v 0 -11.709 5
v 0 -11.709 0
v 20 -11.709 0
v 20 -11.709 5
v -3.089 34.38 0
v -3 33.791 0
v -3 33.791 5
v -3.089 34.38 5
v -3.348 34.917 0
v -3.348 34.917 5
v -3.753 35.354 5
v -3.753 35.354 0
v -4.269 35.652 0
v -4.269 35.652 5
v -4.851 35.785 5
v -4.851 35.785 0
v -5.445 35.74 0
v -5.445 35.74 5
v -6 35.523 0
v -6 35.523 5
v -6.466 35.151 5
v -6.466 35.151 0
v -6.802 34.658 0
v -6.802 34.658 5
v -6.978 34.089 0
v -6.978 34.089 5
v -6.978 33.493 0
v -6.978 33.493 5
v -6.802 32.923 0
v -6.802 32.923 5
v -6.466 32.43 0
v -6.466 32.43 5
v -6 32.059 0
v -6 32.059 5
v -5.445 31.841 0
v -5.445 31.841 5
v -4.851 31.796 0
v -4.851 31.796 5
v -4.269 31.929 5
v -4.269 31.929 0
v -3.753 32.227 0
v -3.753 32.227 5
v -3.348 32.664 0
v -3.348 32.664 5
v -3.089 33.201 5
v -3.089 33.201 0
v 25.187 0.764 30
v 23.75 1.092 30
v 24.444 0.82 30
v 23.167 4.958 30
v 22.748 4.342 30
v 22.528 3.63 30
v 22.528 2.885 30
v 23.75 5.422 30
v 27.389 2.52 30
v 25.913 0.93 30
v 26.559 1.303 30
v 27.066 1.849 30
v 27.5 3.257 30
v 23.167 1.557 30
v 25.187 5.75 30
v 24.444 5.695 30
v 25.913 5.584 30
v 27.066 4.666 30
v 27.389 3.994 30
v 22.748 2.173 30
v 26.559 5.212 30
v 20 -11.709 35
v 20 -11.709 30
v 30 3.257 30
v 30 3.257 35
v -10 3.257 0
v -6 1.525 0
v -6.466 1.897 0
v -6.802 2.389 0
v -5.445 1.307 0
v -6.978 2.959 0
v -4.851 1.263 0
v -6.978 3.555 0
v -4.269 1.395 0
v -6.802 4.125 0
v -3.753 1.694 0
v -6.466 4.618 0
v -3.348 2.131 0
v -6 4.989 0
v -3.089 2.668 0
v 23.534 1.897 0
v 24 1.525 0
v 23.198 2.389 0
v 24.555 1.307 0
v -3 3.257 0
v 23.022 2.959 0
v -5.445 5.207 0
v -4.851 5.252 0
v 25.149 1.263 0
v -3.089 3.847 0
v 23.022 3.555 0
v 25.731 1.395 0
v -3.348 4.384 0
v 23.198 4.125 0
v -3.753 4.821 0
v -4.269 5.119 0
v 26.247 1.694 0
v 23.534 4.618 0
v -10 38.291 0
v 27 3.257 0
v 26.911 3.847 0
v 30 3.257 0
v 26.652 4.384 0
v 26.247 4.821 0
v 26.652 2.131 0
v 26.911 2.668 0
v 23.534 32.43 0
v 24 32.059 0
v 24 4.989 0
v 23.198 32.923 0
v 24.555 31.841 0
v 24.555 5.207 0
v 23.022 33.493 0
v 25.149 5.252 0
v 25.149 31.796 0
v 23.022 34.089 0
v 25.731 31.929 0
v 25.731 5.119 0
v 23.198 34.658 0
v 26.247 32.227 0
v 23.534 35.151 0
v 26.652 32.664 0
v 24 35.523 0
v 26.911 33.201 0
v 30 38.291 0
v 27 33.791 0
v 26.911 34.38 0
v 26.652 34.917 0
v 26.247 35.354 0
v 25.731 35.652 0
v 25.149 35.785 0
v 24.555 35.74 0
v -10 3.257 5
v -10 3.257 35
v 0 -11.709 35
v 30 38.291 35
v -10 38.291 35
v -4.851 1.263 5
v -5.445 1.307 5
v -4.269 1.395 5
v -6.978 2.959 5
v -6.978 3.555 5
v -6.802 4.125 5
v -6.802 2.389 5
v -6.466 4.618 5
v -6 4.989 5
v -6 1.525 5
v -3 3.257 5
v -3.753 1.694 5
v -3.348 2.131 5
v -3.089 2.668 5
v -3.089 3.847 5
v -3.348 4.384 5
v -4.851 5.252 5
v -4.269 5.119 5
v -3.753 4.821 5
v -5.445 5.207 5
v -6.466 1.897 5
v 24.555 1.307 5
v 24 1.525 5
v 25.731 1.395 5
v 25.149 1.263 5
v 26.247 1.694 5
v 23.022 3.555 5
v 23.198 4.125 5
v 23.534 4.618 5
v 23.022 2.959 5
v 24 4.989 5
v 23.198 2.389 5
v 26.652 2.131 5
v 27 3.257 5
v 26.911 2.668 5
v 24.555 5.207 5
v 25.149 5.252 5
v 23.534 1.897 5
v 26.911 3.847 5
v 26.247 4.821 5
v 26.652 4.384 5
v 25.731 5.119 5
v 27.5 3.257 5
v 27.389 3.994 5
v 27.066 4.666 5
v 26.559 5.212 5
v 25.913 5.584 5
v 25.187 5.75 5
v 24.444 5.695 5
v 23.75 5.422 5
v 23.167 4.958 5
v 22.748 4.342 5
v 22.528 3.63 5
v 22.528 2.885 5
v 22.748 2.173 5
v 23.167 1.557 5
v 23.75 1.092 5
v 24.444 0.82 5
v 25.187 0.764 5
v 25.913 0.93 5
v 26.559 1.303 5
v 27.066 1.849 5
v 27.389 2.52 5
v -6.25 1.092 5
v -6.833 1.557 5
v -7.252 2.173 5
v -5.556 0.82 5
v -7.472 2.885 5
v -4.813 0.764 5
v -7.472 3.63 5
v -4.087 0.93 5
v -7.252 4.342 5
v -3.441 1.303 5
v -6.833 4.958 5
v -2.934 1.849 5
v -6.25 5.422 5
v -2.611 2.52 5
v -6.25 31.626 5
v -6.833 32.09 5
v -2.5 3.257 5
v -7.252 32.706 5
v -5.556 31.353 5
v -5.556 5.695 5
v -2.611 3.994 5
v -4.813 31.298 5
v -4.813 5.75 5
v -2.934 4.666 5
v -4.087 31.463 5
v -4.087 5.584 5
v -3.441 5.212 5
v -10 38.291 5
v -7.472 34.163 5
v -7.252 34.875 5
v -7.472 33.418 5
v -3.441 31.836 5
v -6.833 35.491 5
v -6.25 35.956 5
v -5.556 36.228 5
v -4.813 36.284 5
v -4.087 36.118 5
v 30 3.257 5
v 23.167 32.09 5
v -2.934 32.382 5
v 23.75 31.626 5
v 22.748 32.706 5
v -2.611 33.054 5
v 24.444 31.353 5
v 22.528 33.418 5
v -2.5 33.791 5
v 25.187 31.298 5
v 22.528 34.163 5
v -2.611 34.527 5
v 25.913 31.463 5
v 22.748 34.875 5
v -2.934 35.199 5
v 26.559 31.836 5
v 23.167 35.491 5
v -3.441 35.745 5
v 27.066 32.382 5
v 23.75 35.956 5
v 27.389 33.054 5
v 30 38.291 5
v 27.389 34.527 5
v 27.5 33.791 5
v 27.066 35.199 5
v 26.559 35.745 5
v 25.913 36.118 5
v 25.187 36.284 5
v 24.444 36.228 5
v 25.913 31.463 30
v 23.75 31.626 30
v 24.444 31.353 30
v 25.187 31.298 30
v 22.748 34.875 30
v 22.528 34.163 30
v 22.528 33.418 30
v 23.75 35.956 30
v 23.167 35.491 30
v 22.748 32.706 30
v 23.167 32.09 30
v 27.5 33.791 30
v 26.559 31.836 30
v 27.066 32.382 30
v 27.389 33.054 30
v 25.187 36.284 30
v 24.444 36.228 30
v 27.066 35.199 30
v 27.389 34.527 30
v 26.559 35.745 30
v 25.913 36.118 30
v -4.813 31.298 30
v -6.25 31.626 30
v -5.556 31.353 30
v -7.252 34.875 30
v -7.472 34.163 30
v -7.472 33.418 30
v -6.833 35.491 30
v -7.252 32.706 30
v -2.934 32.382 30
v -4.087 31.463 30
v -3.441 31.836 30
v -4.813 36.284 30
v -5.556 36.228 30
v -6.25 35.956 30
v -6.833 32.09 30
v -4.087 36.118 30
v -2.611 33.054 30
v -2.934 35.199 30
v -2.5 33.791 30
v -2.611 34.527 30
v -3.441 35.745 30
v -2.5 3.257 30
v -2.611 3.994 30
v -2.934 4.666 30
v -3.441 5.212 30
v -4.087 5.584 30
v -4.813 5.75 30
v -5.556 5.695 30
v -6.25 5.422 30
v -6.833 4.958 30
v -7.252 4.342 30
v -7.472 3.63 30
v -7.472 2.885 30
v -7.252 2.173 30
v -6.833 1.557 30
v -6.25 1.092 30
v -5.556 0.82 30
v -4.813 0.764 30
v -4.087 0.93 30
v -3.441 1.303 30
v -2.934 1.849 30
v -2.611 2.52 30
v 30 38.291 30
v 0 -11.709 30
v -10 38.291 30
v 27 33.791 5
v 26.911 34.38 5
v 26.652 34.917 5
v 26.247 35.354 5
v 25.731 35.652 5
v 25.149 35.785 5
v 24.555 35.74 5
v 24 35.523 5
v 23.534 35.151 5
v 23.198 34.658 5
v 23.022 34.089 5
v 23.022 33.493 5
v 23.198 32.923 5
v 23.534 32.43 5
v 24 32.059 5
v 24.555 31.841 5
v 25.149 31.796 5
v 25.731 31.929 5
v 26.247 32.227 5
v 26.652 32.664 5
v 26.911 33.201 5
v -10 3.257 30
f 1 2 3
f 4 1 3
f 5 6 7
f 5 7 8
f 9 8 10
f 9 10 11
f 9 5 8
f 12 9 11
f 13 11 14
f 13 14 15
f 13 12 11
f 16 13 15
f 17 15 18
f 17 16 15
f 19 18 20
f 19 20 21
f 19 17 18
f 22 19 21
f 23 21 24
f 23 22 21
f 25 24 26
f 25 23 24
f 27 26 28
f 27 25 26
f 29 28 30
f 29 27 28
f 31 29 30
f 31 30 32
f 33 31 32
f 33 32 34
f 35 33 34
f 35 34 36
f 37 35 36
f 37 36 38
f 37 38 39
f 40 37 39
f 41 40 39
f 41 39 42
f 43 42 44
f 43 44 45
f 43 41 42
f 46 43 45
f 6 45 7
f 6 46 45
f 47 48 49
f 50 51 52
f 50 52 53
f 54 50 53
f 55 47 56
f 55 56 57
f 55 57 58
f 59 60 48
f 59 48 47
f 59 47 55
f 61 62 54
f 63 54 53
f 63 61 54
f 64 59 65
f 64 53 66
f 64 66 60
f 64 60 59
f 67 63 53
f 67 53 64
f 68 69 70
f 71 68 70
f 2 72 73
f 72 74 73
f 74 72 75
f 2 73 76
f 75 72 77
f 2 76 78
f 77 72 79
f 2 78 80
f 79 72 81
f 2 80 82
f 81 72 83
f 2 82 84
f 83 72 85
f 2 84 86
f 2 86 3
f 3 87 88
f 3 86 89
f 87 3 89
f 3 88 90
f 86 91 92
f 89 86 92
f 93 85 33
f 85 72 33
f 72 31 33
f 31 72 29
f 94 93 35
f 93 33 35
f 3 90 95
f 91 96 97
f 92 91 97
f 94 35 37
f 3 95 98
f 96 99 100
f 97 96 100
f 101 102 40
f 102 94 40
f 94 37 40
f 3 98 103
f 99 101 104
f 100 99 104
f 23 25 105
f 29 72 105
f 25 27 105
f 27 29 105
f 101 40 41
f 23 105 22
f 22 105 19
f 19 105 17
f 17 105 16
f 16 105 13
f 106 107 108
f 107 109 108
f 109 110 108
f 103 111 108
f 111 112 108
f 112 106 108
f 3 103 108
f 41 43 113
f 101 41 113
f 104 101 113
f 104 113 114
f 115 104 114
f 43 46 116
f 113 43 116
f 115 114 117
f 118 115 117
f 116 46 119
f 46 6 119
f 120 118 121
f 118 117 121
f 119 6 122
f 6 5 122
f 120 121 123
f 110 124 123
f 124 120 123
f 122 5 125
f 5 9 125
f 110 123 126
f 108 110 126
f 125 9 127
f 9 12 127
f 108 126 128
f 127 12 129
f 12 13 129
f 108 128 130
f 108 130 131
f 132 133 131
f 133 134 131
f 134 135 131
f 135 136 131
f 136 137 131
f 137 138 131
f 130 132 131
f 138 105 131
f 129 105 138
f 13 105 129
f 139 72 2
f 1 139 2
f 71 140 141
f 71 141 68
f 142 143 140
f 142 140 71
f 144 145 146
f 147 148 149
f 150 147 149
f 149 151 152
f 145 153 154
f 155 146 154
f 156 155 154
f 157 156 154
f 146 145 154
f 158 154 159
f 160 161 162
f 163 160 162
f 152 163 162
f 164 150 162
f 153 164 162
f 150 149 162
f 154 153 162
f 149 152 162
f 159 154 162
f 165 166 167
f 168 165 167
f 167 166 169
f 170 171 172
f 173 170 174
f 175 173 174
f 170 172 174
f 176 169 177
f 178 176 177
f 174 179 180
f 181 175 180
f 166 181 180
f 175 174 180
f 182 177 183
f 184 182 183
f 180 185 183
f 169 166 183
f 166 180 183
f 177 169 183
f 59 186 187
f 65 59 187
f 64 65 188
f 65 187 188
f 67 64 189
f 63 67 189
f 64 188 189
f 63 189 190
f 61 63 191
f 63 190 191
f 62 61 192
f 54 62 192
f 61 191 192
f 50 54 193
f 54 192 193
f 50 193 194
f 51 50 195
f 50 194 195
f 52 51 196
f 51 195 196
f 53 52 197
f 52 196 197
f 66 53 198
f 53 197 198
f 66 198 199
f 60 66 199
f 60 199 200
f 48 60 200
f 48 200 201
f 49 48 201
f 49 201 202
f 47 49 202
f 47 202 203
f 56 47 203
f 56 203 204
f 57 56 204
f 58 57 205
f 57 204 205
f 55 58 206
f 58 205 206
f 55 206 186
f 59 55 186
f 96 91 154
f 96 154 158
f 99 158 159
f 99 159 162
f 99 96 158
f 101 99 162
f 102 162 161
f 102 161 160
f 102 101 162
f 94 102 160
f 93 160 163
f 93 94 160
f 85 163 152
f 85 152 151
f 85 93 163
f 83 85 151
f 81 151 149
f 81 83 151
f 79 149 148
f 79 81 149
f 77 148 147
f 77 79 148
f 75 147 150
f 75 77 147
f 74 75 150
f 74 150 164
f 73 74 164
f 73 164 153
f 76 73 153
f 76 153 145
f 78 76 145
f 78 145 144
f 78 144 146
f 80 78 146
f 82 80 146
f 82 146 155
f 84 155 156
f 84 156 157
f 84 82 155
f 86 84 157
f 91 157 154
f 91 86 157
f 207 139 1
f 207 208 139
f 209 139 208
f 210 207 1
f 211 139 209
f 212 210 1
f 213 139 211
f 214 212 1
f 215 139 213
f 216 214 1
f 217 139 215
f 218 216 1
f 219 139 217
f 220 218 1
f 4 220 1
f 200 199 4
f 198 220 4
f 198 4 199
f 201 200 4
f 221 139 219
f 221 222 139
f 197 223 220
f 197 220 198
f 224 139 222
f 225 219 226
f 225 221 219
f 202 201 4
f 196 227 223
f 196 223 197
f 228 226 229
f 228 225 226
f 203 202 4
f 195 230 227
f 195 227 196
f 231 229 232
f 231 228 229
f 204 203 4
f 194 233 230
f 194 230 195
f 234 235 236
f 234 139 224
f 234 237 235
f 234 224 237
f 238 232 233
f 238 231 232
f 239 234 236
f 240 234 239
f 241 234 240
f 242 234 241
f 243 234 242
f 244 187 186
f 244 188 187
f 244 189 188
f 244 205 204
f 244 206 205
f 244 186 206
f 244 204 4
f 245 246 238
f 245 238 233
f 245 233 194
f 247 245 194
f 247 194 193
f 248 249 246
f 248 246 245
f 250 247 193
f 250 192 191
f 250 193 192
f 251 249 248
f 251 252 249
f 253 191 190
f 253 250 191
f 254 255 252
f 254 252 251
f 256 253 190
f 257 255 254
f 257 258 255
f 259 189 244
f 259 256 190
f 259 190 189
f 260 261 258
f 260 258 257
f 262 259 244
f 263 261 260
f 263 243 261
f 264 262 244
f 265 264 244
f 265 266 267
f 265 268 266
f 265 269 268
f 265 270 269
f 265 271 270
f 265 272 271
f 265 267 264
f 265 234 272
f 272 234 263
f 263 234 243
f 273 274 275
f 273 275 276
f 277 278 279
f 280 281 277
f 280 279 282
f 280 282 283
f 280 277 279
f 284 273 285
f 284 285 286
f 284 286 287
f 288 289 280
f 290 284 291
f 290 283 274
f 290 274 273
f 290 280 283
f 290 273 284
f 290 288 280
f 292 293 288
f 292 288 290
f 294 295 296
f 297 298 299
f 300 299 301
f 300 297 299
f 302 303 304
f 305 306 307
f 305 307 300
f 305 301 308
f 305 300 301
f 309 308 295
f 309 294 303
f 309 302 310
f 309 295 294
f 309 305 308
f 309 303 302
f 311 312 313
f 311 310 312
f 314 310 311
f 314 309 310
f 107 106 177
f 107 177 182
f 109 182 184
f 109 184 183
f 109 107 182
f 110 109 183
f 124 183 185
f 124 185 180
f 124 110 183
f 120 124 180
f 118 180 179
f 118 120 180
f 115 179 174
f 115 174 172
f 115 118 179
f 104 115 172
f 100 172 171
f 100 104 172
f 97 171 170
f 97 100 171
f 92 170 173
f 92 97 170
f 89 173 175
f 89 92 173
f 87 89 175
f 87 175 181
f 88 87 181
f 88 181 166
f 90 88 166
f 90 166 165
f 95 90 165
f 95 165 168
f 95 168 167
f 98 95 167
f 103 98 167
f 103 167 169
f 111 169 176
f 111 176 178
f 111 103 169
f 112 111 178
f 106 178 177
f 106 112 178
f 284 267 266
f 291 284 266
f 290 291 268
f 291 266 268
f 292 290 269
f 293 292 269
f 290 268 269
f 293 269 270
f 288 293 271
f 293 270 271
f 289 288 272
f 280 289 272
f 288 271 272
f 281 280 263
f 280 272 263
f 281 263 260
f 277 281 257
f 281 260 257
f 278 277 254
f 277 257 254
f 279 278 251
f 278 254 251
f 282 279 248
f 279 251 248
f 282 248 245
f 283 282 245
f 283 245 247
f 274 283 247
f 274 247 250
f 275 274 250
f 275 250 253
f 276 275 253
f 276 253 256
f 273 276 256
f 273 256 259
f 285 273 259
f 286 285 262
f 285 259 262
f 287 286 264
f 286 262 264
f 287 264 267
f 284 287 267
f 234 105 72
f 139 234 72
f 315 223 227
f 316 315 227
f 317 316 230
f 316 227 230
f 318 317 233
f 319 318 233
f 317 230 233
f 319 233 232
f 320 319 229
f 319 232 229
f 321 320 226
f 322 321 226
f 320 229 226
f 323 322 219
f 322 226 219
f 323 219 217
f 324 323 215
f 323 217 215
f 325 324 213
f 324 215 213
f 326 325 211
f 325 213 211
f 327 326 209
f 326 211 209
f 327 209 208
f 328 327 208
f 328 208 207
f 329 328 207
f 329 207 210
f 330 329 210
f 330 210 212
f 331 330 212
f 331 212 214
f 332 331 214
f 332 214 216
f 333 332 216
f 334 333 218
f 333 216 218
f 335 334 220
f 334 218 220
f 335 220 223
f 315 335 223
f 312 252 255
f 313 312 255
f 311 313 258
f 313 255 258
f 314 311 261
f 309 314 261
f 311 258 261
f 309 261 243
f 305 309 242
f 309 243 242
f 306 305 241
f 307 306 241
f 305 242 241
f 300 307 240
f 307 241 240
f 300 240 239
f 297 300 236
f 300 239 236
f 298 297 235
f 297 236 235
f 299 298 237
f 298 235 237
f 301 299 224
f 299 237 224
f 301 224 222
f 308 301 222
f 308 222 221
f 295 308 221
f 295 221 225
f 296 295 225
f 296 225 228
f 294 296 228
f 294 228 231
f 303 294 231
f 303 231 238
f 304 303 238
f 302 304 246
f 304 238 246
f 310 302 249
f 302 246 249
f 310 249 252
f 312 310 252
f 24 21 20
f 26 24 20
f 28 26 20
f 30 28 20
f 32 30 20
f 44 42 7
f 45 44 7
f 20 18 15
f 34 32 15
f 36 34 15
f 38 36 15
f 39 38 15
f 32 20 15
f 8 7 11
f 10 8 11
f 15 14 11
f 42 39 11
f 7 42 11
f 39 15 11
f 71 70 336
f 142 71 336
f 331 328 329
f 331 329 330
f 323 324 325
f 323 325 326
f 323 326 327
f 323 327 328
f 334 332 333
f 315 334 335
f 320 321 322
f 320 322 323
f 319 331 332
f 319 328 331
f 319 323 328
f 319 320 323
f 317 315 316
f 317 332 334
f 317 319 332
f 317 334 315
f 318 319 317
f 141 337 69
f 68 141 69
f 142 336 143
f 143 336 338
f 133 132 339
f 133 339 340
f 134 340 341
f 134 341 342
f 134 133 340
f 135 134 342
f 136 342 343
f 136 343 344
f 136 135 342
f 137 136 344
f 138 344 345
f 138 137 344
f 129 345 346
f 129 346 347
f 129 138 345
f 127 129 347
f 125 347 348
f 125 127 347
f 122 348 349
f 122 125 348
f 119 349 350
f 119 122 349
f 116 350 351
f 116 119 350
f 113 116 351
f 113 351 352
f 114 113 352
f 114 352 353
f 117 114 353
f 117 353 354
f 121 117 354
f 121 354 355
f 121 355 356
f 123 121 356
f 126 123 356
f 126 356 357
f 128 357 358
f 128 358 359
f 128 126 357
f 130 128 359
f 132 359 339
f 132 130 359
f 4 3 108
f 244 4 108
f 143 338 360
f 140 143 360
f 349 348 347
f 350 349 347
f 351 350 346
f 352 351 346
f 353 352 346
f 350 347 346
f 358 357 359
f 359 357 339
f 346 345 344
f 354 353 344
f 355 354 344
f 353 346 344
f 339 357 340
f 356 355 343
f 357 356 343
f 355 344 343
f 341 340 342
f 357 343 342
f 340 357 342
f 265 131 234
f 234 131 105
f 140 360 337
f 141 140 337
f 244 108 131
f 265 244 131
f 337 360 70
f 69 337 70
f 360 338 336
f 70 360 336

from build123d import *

# Parameters (mm, degrees)
F0_R     = 2
F1_DEPTH = 5
F2_R     = 2.5
F2_R_2   = 2
F3_R     = 2.5
F4_DEPTH = 25
F6_DEPTH = 5


with BuildPart() as f1:
    # F0 (on Top) → F1 (new body)
    with BuildSketch(Plane.XY):
        Polygon((30, 38.2905970075), (-10, 38.2905970075), (-10, 3.2572265546), (0, -11.7094029925), (20, -11.7094029925), (30, 3.2572265546), align=None)
        with Locations((-5, 3.2572265546)):
            Circle(F0_R, mode=Mode.SUBTRACT)
        with Locations((25, 3.2572265546)):
            Circle(F0_R, mode=Mode.SUBTRACT)
        with Locations((-5, 33.7905970075)):
            Circle(F0_R, mode=Mode.SUBTRACT)
        with Locations((25, 33.7905970075)):
            Circle(F0_R, mode=Mode.SUBTRACT)
    extrude(amount=F1_DEPTH)

    # F2 (on face) + F3 (on face) → F4 (join)
    with BuildSketch(Plane.XY.offset(5)):
        with Locations((-5, 33.7905970075)):
            Circle(F2_R)
        with Locations((-5, 33.7905970075)):
            Circle(F2_R_2, mode=Mode.SUBTRACT)
        with Locations((25, 3.2572265546)):
            Circle(F2_R)
        with Locations((25, 3.2572265546)):
            Circle(F2_R_2, mode=Mode.SUBTRACT)
        with Locations((-5, 33.7905970075)):
            Circle(F2_R_2)
        with Locations((25, 33.7905970075)):
            Circle(F2_R_2)
        with Locations((25, 3.2572265546)):
            Circle(F2_R_2)
        with Locations((-5, 3.2572265546)):
            Circle(F2_R_2)
    with BuildSketch(Plane.XY.offset(5)):
        with Locations((25, 33.7905970075)):
            Circle(F3_R)
        with Locations((-5, 3.2572265546)):
            Circle(F3_R)
    extrude(amount=F4_DEPTH)


with BuildPart() as f6:
    # F5 (on face) → F6 (new body)
    with BuildSketch(Plane.XY.offset(30)):
        Polygon((30, 38.2905970075), (-10, 38.2905970075), (-10, 3.2572265546), (0, -11.7094029925), (20, -11.7094029925), (30, 3.2572265546), align=None)
    extrude(amount=F6_DEPTH)


solid = Compound([f1.part, f6.part])
